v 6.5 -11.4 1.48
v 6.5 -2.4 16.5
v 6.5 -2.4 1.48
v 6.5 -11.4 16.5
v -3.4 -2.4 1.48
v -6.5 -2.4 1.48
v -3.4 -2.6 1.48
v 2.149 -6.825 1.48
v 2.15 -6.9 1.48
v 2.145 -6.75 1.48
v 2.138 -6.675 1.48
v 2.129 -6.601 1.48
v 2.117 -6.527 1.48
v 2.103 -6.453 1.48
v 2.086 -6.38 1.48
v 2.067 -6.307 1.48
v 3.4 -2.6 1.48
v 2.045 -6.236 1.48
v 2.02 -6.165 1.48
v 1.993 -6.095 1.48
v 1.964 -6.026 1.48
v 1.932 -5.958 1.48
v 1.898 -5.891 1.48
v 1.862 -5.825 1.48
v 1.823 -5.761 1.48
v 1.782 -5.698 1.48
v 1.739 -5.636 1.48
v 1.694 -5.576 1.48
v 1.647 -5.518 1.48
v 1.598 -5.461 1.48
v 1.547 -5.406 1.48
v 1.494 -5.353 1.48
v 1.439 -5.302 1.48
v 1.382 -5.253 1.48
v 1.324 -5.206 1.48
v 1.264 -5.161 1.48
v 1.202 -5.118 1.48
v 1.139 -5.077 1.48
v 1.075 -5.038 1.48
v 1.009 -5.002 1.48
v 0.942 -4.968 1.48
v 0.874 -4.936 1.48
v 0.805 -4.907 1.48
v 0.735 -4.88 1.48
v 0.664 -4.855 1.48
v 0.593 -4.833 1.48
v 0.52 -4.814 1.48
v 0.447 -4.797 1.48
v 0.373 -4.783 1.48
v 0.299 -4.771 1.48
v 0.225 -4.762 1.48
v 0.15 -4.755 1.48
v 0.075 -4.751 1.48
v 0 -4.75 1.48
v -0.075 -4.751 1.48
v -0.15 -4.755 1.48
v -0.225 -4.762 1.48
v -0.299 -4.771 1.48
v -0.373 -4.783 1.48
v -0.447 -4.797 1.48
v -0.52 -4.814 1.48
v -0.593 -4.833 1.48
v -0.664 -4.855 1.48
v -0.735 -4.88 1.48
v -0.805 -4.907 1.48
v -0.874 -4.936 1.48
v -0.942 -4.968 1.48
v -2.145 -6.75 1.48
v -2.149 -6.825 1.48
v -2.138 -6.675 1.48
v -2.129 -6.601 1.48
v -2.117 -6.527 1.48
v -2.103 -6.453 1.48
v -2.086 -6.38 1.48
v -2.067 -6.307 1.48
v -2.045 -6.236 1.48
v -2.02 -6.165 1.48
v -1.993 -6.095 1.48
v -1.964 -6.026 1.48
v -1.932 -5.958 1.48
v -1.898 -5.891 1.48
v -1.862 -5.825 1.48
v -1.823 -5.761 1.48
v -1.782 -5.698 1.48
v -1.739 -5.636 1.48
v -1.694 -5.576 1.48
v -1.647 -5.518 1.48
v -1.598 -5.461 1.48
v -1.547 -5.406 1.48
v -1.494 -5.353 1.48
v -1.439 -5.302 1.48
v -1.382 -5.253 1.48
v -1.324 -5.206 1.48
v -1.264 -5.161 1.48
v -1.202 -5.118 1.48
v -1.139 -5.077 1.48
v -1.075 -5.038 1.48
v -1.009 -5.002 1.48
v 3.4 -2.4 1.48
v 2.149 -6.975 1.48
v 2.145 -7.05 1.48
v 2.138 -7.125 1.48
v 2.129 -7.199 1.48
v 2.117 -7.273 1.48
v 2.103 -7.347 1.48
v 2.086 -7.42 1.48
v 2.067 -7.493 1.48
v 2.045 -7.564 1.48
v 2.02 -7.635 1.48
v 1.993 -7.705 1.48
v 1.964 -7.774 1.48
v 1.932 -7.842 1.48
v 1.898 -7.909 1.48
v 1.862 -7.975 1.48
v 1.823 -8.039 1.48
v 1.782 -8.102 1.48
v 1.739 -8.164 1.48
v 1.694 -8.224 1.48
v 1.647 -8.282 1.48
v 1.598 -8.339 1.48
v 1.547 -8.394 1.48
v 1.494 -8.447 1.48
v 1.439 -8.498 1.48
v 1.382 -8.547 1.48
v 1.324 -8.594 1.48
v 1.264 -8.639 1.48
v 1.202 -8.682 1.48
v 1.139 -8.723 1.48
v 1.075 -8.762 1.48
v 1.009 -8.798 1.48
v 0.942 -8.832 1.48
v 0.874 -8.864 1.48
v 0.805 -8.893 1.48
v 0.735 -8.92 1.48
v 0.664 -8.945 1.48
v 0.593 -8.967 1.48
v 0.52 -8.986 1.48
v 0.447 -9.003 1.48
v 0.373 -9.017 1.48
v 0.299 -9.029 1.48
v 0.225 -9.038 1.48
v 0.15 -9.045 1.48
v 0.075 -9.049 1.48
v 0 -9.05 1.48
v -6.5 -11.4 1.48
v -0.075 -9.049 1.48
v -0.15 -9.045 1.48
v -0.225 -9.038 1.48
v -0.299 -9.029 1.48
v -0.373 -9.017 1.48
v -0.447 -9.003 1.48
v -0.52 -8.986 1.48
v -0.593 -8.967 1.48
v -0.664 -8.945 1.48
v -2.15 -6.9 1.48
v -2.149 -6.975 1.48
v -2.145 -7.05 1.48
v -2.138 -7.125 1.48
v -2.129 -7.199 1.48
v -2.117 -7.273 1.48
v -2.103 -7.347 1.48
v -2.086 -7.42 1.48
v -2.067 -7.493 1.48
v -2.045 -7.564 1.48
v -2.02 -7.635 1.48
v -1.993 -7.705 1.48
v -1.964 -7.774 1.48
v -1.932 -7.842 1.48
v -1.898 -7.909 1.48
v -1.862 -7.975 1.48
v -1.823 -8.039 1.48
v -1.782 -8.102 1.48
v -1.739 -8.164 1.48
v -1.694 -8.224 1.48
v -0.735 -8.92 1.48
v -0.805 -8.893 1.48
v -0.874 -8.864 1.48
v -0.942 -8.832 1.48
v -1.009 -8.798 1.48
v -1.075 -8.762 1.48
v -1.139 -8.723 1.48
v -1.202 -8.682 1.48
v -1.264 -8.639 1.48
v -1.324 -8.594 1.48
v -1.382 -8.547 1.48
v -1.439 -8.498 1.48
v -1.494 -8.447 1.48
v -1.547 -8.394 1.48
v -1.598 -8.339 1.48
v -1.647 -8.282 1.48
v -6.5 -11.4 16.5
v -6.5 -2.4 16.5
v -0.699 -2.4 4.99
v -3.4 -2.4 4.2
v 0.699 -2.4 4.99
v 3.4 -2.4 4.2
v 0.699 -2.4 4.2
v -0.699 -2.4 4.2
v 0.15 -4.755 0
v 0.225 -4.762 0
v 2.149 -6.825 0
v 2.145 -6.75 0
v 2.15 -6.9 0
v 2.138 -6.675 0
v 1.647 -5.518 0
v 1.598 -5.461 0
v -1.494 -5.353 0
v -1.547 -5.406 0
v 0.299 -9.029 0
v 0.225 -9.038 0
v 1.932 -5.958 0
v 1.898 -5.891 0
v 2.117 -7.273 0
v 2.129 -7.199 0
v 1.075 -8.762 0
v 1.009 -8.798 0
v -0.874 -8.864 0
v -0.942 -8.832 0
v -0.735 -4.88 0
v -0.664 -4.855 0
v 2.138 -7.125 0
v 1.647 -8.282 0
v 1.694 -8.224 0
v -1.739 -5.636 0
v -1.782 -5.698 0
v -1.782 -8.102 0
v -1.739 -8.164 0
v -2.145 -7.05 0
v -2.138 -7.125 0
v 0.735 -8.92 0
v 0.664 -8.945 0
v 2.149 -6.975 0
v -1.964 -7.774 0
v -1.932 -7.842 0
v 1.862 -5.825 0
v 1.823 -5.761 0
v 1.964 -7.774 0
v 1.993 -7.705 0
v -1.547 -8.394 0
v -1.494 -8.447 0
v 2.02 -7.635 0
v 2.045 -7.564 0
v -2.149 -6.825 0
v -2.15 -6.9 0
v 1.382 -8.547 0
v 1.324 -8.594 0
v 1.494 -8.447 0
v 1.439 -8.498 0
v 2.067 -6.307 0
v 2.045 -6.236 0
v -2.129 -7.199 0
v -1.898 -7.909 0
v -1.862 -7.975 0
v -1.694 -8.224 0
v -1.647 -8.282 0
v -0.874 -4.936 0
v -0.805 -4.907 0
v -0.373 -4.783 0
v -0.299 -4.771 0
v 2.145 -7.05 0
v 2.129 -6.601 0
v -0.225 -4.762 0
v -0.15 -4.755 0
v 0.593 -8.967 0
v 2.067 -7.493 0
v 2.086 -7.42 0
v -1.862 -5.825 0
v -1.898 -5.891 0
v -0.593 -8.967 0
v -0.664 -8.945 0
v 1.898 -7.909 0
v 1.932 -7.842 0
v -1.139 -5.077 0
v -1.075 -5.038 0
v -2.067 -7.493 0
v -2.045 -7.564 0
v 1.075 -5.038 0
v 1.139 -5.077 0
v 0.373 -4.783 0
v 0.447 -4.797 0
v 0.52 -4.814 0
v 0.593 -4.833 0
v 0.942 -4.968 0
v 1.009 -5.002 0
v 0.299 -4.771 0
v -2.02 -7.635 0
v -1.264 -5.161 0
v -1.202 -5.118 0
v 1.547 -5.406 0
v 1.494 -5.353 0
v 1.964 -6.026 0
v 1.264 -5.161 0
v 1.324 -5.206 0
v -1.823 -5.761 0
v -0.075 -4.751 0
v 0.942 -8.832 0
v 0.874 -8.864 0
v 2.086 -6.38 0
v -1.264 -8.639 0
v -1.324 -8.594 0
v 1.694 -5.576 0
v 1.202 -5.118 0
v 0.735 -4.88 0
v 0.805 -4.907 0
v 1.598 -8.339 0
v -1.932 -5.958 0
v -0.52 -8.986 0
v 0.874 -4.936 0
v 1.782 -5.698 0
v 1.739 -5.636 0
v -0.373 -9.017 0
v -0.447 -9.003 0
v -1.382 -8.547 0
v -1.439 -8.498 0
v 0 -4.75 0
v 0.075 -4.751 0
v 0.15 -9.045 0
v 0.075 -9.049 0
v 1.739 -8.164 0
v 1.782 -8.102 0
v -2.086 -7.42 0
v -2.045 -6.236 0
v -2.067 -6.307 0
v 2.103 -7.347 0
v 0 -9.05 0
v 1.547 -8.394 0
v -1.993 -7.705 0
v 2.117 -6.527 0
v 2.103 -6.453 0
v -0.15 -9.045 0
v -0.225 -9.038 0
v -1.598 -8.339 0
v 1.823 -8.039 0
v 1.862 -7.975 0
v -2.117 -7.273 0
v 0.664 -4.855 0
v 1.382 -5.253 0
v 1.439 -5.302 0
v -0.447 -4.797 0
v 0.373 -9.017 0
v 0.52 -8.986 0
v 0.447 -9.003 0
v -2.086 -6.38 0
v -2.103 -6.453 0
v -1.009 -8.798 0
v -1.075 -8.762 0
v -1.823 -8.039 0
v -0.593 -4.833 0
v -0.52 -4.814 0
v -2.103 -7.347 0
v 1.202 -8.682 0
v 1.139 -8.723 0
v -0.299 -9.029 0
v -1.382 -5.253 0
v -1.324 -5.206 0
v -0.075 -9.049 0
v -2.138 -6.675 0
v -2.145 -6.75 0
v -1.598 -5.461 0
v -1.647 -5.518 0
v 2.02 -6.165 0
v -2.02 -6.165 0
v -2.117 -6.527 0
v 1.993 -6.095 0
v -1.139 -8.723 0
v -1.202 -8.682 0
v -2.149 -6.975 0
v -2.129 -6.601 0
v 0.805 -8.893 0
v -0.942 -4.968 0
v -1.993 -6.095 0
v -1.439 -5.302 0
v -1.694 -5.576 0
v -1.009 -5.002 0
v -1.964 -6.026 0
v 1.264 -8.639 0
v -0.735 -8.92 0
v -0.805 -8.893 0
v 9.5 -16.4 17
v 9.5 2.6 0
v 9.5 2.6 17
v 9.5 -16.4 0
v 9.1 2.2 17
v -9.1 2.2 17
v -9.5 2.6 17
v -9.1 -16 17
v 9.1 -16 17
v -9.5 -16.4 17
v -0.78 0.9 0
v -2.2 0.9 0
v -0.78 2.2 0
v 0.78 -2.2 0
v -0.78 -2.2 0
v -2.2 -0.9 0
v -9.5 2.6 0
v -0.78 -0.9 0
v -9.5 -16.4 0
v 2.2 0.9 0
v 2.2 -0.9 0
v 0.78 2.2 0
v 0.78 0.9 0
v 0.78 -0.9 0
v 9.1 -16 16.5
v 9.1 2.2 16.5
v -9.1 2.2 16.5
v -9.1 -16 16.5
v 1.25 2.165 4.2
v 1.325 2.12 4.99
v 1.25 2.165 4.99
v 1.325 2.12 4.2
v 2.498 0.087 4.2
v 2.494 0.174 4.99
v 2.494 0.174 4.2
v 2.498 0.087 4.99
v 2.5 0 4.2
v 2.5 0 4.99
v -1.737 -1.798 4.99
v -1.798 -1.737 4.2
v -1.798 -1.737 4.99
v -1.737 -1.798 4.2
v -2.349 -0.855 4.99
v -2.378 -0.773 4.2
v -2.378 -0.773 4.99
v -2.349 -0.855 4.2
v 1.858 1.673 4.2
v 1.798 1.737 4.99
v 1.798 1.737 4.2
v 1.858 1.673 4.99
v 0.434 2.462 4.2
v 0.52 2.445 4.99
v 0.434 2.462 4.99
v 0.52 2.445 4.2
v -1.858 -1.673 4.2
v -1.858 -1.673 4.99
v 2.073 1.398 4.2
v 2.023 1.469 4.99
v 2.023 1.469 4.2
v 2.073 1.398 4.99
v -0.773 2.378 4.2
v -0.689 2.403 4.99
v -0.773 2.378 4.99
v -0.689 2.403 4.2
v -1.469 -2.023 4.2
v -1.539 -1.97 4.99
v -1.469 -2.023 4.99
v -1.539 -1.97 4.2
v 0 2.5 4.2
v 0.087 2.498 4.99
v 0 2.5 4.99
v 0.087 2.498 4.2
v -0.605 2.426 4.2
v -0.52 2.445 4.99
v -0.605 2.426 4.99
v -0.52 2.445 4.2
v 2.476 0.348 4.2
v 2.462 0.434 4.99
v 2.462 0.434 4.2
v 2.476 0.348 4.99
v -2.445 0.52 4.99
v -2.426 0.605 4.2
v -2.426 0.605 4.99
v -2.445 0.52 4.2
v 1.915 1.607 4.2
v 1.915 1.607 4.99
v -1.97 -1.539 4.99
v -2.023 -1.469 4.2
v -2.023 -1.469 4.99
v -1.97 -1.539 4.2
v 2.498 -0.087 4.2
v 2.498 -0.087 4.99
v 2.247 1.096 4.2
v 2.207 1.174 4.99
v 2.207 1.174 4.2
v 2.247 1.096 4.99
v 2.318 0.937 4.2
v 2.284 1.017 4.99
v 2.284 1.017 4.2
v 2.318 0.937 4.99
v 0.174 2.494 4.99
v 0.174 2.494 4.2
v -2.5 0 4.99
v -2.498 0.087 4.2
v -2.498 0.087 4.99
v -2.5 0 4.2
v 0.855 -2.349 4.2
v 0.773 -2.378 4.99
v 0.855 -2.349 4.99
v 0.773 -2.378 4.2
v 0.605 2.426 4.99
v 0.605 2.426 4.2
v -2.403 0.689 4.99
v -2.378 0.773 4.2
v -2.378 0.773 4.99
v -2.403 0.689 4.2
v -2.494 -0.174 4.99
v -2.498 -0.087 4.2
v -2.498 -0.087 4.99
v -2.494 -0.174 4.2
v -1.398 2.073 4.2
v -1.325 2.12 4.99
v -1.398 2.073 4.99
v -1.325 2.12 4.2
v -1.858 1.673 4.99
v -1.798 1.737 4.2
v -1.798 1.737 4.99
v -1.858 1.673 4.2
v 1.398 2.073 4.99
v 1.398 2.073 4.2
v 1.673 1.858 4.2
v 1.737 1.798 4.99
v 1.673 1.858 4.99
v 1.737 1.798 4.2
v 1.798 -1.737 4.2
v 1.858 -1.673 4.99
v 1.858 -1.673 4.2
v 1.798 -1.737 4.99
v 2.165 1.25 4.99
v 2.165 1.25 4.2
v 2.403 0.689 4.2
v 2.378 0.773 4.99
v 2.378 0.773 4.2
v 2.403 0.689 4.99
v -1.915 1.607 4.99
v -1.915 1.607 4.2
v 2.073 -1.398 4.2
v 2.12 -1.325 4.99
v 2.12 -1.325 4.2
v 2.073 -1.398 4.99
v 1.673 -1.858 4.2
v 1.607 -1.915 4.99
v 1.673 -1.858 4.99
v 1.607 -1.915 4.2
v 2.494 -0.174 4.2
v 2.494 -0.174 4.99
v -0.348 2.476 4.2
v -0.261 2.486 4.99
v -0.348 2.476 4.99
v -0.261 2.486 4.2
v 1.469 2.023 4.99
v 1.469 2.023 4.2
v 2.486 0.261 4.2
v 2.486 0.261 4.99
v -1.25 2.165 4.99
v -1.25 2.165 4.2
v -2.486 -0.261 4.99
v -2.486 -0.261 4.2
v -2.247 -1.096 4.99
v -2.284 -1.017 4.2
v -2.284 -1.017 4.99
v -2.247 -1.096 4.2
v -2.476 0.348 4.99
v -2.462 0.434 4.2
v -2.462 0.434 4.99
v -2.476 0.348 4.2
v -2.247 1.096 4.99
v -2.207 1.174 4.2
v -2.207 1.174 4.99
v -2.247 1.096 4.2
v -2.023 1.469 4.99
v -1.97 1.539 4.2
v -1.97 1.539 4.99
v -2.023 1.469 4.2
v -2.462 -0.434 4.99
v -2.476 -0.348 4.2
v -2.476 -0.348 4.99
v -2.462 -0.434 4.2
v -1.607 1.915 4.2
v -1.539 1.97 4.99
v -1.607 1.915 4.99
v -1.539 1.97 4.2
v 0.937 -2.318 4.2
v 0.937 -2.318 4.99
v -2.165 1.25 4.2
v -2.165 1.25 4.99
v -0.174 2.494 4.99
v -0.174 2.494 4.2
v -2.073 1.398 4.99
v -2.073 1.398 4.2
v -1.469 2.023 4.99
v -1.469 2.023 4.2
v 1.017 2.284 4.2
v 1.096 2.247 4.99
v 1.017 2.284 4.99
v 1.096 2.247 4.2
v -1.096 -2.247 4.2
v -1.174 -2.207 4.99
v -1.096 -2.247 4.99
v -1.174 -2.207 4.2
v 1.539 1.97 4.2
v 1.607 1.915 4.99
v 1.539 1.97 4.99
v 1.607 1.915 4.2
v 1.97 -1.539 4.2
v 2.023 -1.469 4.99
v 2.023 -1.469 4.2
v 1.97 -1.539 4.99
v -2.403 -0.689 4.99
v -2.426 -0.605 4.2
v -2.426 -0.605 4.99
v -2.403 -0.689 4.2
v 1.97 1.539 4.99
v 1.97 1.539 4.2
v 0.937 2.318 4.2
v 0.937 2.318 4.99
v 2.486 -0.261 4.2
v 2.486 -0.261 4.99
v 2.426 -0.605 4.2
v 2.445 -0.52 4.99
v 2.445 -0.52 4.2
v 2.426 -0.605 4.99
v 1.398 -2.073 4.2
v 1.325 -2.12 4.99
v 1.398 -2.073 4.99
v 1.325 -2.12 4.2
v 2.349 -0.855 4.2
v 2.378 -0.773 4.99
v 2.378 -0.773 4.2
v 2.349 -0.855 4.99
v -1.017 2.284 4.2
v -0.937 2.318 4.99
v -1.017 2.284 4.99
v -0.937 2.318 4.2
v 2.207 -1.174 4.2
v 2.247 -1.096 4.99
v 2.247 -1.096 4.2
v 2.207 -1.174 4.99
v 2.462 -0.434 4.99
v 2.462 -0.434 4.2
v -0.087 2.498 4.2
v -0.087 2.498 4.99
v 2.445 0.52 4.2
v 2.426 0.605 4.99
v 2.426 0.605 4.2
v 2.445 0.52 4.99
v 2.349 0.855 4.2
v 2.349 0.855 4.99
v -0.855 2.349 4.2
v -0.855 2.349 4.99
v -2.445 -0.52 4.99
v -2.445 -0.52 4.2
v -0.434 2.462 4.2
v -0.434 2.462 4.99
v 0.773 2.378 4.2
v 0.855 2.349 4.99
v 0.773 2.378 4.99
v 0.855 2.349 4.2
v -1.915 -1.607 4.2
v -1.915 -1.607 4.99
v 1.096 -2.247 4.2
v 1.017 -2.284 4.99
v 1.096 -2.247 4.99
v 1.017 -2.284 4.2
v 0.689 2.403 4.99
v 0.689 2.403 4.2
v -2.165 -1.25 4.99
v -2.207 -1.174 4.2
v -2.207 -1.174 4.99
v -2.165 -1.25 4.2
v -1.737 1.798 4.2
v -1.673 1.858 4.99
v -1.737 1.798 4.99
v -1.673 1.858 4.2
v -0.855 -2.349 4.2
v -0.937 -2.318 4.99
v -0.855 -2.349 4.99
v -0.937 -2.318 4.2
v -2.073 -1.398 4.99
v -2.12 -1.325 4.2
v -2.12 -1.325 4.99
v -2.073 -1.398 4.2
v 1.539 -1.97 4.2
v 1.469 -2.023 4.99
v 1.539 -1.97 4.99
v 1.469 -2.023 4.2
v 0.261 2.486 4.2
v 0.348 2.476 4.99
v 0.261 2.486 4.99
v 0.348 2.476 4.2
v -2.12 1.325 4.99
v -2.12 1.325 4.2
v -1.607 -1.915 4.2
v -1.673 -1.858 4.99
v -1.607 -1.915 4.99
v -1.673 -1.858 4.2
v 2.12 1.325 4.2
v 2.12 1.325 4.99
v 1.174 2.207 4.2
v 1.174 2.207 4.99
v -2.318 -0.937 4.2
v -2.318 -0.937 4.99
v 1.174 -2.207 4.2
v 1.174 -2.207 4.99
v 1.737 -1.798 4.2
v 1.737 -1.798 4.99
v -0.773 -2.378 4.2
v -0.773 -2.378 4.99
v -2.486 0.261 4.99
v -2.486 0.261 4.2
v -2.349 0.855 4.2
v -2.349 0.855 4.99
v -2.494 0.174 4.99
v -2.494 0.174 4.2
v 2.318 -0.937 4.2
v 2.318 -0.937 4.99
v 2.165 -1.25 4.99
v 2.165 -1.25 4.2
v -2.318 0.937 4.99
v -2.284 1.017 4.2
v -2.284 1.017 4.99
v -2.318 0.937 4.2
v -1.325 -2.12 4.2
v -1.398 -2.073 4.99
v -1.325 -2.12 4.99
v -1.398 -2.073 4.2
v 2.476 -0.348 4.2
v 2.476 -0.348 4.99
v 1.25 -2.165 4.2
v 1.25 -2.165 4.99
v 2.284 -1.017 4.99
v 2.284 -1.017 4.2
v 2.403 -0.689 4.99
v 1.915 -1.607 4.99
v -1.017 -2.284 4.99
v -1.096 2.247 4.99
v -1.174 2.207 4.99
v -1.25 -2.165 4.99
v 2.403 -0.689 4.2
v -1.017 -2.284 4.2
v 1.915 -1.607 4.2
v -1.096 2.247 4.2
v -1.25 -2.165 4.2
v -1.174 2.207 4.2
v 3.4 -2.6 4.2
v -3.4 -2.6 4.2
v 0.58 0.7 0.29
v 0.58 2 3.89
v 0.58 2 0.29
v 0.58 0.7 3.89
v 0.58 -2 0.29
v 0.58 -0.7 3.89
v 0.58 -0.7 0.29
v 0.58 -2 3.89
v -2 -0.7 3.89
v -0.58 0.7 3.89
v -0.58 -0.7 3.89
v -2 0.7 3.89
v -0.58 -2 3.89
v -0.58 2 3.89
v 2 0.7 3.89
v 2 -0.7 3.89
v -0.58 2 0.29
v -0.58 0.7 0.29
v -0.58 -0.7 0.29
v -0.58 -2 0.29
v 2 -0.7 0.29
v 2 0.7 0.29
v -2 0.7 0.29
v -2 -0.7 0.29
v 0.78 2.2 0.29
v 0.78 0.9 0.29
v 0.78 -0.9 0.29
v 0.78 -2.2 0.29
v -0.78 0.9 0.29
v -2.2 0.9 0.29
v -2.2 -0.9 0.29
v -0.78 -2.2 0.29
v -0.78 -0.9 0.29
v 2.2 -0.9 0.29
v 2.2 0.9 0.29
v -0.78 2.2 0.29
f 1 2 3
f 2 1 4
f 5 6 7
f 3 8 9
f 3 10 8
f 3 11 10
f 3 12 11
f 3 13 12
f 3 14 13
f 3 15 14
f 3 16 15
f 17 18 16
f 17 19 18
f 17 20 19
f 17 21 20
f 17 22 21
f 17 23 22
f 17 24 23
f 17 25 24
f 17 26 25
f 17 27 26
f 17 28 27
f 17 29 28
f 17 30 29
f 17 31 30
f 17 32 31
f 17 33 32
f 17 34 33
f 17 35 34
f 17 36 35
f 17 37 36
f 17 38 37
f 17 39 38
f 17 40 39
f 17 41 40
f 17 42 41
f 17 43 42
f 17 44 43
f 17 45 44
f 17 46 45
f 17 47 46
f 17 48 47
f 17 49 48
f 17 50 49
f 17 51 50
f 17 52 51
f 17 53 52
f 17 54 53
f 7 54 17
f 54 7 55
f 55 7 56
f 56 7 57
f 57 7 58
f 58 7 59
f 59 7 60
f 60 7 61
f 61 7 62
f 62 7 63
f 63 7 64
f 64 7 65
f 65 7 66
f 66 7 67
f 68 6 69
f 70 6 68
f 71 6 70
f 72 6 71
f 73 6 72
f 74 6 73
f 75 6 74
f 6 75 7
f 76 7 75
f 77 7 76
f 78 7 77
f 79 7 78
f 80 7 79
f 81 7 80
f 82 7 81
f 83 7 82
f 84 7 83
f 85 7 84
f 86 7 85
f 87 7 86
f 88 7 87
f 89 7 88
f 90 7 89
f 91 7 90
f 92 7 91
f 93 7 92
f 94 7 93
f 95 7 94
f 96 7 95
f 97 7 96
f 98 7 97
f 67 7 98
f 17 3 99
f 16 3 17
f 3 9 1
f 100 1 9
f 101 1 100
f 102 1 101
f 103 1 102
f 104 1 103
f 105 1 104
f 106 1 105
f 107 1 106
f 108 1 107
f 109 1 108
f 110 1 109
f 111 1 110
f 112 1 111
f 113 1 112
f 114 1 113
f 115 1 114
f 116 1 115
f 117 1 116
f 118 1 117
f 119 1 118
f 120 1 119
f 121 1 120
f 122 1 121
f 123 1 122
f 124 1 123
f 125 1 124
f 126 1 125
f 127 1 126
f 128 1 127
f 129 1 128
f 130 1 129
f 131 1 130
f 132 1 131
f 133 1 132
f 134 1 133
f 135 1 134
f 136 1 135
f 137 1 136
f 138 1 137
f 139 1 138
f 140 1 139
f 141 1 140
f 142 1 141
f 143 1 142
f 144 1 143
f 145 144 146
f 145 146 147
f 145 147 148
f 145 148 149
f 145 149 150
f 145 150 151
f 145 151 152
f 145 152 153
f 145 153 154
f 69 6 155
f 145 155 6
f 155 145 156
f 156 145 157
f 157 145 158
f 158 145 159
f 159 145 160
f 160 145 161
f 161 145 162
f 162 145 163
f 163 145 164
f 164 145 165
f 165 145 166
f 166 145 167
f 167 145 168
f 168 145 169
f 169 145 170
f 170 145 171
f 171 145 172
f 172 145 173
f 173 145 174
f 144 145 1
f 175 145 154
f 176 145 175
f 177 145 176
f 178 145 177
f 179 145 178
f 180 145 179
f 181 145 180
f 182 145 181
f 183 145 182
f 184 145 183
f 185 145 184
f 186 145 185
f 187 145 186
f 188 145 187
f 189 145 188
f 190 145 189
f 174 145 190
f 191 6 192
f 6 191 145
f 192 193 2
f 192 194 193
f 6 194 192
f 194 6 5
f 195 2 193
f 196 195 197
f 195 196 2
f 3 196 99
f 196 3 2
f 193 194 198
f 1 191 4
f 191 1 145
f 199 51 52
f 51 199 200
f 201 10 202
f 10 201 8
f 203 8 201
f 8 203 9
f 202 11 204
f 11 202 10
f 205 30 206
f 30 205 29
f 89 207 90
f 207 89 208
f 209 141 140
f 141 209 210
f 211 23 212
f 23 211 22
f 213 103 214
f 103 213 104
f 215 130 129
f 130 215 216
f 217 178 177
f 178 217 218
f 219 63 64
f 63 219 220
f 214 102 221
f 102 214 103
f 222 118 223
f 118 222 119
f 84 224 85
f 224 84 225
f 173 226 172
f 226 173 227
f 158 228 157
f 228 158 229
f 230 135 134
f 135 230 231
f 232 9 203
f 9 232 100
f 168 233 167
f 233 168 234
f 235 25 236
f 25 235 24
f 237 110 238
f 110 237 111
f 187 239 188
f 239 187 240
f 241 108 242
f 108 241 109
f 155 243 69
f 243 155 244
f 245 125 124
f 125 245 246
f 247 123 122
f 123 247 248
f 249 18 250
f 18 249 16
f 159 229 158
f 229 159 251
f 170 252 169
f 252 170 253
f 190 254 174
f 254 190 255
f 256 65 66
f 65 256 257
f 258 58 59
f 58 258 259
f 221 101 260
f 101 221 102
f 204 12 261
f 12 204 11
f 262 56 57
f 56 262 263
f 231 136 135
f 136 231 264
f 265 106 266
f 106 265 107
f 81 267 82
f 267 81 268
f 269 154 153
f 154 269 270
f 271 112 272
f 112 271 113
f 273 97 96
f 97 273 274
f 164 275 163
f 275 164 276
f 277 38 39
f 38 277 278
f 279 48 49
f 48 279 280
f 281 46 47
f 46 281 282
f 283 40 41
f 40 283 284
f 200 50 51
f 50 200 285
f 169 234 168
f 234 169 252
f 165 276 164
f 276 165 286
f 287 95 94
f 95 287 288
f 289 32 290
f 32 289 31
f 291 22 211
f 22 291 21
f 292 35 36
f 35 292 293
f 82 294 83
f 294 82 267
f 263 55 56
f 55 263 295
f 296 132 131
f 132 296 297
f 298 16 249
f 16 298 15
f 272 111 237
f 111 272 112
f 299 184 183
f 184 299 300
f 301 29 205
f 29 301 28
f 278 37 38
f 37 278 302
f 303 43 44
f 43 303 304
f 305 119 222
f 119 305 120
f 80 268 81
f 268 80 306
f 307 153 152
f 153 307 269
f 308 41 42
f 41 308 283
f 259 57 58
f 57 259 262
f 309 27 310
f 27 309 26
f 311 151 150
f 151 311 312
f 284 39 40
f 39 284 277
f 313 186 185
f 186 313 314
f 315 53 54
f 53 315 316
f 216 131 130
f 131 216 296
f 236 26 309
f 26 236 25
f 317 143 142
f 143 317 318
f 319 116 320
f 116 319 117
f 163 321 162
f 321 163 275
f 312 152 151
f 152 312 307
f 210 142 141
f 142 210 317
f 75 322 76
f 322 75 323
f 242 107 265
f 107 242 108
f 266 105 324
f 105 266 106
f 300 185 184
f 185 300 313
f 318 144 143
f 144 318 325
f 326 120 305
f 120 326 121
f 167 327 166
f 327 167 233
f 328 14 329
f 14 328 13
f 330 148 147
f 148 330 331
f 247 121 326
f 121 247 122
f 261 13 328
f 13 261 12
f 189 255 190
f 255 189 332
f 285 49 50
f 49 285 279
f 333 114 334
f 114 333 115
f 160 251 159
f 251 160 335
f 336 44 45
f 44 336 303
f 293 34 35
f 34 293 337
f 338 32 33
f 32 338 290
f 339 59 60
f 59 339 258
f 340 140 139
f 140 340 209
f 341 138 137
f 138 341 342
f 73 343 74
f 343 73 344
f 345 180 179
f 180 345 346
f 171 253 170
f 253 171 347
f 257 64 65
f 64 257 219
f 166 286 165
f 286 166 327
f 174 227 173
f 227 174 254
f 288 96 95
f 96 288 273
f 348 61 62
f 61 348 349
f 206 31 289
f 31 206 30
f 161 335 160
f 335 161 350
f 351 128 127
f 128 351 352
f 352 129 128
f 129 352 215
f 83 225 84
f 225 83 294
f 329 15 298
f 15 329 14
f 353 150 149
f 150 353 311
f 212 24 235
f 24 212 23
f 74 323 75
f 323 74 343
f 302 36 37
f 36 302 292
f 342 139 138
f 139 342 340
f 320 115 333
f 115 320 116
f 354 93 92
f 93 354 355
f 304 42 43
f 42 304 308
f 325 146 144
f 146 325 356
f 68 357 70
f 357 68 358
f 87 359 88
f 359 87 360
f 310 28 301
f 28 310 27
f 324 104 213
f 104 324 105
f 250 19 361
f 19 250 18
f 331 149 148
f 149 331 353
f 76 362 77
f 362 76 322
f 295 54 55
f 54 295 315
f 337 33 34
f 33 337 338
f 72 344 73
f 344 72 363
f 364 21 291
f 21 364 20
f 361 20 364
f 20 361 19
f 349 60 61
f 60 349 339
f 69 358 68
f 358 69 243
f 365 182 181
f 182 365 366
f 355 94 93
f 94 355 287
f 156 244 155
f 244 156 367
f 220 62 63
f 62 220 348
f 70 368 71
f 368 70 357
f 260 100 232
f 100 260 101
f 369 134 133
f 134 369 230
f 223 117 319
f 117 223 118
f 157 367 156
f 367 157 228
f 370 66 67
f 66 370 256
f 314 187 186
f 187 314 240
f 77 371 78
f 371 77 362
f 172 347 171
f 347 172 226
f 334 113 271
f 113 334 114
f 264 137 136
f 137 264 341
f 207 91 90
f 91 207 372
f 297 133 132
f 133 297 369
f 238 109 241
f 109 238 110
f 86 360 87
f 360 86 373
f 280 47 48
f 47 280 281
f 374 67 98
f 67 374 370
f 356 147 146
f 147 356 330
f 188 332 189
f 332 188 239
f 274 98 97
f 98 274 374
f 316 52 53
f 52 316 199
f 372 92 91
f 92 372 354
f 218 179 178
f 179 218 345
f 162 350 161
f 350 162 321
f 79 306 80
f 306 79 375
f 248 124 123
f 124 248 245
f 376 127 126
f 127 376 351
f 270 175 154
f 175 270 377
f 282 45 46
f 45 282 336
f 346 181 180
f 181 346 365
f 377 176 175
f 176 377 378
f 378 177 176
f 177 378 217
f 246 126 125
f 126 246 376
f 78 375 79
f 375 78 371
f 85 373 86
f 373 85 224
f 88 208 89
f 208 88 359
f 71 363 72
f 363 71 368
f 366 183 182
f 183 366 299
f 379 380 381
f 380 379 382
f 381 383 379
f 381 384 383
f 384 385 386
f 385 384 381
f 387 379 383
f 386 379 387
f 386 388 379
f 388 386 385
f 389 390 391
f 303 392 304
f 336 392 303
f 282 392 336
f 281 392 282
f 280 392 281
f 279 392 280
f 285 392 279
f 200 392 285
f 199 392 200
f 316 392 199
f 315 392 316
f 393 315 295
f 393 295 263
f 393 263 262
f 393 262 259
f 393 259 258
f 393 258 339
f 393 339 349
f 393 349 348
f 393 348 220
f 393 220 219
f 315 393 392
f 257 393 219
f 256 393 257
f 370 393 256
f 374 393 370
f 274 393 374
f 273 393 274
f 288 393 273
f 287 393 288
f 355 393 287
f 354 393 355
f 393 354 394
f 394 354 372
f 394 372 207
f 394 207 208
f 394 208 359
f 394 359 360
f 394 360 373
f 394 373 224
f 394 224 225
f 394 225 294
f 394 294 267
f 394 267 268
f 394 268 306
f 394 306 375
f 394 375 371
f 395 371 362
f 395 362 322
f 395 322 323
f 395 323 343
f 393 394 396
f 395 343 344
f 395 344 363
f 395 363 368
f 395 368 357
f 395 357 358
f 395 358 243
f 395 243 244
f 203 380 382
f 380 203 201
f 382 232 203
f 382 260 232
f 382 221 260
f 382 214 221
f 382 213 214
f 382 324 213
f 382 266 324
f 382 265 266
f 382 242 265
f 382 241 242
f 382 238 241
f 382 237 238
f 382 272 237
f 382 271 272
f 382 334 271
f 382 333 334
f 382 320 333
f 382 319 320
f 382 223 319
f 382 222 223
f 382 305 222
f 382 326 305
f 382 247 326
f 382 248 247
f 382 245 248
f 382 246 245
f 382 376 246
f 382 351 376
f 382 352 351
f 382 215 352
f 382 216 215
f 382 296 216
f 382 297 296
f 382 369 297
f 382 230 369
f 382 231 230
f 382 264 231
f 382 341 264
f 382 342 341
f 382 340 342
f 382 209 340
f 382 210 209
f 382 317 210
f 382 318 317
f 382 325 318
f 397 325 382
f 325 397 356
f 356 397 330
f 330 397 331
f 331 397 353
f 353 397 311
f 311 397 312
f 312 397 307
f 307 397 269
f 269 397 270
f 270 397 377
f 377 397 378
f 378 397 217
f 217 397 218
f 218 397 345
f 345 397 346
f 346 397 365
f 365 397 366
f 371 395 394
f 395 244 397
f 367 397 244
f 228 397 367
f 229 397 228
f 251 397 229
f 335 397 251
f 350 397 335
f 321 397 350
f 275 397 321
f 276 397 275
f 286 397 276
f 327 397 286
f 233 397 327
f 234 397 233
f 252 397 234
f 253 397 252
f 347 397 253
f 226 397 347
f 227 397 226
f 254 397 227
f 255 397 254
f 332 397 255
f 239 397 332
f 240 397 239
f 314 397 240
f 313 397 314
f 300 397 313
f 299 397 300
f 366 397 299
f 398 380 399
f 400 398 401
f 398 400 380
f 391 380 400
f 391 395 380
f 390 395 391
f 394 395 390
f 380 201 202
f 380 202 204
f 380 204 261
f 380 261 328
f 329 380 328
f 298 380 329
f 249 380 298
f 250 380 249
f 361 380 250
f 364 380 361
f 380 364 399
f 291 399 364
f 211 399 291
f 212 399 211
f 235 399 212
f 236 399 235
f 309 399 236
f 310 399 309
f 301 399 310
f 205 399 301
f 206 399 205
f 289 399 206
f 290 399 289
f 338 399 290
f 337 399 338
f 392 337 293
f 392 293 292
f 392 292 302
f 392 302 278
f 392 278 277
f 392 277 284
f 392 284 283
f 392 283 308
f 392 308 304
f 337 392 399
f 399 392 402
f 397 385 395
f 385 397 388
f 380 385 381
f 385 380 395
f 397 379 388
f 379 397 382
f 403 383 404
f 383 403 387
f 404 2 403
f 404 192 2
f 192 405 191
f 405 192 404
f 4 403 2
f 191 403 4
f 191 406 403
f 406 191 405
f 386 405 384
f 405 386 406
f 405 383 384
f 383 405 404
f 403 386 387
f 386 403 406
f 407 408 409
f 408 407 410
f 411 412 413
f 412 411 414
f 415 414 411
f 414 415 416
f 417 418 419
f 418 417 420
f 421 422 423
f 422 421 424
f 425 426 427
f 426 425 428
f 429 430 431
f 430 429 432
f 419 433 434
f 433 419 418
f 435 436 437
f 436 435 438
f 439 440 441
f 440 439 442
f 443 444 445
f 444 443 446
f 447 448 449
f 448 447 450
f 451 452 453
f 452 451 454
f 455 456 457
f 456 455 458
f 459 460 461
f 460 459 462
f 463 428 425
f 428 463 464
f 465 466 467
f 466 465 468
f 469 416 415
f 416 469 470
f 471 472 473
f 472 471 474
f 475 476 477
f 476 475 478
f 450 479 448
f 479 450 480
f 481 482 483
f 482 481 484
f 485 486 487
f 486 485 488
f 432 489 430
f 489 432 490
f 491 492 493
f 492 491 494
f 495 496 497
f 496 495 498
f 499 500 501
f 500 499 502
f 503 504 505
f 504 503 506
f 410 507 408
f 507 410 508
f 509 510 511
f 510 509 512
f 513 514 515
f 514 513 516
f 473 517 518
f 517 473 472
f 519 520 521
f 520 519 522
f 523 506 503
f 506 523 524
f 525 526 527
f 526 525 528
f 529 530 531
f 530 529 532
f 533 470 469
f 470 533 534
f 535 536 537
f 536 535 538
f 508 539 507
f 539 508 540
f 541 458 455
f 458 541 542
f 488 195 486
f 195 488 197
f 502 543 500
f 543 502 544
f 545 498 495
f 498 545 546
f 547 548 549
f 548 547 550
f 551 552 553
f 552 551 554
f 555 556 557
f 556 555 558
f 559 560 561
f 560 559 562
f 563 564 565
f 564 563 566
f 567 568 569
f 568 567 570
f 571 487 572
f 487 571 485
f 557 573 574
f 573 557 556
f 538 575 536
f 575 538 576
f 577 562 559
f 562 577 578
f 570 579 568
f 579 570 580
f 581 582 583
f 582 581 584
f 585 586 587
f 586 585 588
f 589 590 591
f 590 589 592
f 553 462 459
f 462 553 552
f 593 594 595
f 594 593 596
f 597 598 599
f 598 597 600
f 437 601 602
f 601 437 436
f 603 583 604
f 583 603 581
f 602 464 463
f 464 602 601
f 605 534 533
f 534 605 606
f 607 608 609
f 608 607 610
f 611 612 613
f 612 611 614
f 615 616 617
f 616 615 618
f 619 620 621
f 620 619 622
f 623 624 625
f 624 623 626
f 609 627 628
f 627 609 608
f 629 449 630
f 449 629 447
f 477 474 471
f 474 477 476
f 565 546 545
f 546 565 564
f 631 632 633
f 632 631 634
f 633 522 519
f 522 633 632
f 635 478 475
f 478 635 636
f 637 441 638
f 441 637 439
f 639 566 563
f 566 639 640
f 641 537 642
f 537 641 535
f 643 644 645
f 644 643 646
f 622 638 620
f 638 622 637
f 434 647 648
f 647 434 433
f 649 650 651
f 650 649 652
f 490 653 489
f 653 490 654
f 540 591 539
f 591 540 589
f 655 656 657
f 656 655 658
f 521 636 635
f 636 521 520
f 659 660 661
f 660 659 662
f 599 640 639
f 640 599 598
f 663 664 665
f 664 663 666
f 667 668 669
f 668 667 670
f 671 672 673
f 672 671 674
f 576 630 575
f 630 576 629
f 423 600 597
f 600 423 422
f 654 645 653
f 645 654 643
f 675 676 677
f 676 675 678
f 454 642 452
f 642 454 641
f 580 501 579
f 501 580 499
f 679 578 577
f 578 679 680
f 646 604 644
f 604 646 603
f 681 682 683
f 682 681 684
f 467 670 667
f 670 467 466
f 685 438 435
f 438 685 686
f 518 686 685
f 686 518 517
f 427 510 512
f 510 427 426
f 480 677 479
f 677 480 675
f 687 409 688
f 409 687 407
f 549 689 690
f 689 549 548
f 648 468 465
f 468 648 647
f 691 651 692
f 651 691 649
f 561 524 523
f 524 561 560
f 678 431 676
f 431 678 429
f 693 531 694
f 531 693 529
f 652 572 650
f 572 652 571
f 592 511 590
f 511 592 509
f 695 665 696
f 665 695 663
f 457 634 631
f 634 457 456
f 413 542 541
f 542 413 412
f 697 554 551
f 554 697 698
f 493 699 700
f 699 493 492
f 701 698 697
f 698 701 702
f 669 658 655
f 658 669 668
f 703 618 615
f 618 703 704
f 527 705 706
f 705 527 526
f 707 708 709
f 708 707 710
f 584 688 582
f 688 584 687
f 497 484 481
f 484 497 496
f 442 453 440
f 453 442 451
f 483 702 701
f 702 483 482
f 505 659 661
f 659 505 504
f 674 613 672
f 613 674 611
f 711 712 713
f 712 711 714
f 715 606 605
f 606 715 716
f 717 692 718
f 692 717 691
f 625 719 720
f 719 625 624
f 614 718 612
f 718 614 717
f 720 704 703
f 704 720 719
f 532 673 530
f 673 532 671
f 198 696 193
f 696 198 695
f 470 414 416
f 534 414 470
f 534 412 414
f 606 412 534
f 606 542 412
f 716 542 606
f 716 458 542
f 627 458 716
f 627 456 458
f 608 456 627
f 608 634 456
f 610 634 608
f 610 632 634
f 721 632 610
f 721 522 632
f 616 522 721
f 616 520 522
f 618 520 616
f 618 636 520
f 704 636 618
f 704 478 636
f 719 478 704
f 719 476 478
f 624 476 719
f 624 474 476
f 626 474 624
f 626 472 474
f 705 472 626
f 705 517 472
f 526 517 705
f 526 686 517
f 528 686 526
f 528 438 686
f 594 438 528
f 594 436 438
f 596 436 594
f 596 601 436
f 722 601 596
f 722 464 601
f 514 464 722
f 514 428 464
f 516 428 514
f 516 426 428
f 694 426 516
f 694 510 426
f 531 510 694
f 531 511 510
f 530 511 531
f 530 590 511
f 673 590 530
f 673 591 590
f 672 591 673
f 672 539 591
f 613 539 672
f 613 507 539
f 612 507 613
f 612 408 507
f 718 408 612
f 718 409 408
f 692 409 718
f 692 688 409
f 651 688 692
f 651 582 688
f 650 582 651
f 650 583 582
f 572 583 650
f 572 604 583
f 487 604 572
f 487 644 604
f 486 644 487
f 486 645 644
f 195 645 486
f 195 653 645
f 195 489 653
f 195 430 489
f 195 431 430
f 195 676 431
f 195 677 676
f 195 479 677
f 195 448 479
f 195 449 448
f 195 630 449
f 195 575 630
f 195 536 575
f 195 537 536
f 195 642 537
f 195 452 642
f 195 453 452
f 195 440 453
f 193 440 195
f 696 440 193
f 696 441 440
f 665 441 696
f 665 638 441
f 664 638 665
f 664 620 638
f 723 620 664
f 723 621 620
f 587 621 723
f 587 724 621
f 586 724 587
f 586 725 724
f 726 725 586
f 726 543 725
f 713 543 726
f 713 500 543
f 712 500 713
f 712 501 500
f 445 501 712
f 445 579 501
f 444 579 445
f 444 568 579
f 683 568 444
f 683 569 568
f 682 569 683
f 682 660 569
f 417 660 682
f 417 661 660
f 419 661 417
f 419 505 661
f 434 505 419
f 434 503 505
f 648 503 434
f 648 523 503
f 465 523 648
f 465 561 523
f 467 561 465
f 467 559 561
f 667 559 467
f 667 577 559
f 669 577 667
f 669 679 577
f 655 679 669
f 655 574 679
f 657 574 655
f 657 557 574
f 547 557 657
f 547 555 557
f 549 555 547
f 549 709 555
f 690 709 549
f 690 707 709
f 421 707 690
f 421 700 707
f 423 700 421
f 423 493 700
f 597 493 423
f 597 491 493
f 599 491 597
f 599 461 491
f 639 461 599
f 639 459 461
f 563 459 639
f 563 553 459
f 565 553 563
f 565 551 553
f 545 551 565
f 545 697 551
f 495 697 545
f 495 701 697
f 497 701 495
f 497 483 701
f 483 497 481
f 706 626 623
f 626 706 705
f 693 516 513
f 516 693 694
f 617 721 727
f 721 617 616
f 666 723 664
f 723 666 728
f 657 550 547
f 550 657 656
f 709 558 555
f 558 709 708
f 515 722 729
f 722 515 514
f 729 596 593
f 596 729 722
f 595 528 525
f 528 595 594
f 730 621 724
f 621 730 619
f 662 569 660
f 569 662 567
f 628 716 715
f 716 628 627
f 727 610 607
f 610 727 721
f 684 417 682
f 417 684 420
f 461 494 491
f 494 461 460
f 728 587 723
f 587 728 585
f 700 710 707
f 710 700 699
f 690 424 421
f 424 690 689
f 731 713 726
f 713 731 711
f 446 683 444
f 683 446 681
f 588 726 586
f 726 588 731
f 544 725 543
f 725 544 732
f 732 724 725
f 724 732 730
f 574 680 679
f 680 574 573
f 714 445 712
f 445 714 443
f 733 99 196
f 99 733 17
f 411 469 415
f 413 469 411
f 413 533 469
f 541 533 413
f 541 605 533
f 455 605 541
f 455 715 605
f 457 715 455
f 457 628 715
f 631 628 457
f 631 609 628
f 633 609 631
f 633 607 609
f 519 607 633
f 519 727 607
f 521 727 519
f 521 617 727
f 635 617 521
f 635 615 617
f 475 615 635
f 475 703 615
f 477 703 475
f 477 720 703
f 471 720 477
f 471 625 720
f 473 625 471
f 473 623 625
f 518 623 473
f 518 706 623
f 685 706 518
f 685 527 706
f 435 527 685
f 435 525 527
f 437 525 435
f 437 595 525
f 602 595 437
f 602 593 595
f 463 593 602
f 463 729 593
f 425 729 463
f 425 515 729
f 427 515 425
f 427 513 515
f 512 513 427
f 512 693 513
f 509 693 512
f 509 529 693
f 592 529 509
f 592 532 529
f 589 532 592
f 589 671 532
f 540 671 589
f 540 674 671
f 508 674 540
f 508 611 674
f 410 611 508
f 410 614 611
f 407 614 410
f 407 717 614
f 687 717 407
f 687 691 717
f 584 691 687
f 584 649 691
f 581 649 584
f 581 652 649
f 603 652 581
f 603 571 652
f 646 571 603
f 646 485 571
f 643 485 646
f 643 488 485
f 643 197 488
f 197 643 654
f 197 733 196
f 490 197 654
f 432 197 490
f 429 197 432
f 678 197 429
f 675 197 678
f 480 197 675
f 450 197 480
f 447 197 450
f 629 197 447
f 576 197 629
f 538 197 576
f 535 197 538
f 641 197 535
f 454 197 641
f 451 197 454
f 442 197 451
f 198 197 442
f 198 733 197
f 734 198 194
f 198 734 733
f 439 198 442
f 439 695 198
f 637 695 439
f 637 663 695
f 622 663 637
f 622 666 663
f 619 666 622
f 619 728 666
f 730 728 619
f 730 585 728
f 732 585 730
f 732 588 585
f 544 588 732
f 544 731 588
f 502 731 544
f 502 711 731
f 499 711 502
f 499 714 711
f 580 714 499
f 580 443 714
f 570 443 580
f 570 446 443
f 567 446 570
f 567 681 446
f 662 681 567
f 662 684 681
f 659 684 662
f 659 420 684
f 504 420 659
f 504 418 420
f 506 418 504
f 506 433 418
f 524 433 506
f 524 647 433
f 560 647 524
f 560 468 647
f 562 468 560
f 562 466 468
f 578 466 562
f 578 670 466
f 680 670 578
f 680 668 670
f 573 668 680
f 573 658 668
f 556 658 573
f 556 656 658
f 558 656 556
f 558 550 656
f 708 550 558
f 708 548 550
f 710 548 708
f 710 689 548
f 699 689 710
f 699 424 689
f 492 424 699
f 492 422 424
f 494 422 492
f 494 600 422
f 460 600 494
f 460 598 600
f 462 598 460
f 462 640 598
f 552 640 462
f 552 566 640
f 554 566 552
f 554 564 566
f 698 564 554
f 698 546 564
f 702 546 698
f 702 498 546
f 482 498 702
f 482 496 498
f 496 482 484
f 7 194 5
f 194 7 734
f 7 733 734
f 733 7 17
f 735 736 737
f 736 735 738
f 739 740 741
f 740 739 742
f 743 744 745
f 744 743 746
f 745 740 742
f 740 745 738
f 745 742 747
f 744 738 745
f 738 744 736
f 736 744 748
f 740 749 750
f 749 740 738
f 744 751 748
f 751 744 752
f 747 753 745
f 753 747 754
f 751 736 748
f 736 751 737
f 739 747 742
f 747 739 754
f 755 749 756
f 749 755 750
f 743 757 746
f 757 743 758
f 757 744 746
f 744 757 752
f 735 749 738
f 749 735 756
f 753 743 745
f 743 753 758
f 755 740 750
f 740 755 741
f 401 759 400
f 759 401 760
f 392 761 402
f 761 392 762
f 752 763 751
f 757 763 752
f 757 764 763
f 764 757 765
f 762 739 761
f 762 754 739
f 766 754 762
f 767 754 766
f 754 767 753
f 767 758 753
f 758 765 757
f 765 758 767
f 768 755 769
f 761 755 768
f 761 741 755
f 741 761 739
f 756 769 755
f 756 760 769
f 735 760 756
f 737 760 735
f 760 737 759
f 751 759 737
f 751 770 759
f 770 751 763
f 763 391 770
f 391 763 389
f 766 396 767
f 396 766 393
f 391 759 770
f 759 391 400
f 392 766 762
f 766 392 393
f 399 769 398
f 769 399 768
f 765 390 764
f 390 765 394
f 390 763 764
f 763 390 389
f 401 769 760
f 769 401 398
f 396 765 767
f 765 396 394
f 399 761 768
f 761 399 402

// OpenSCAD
// file: cherry-female.scad
$fn=180;
eps=0.01;

// Params Cherry mate
cherry_thick1=1.16;
cherry_thick2=1.40;
cherry_wide=4.00;
cherry_high=3.90;
//shaft_high=5.00;
shaft_high=cherry_high+0.3;
shaft_wide=6.80;
shaft_deep=5.20;
fudge_high=0.30;
fudge_plus=0.40;

// Cherry mate
difference() {
    // base body
    translate([0, 0, shaft_high/2]) cube([shaft_wide, shaft_deep, shaft_high], center=true);
    // cherry splines
    translate([0, 0, cherry_high/2-eps]) 
        cube([cherry_thick1, cherry_wide, cherry_high], center=true); 
    translate([0, 0, cherry_high/2-eps]) 
        cube([cherry_wide, cherry_thick2, cherry_high], center=true); 
    // fudge bottom layer
    translate([0, 0, fudge_high/2-eps]) 
        cube([cherry_thick1+fudge_plus, cherry_wide+fudge_plus, fudge_high], center=true); 
    translate([0, 0, fudge_high/2-eps]) 
        cube([cherry_wide+fudge_plus, cherry_thick2+fudge_plus, fudge_high], center=true);
    
    
    // debug
    //translate([0, 0, -0.01]) cube(90);
}
// main file
$fn=180;
eps=0.01;

// keycap model
// 0 is fcu square
// 1 is smaller rect
// 2 is big warn square
// 3 is small TO config
kmod=2;

// Params key cap
kc_tall=17.00;
kc_high=[11.589, 7.753, 19.00, 7.753];
kc_wide=[11.589, 11.589, 19.00, 11.589];
led_high=[3.123, 3.123, 9.000, 0];
led_wide=[8.958, 8.958, 13.000, 0];
led_x=(kc_wide[kmod]-led_wide[kmod])/2;
//led_y=[1.791, 1.253, 4.50, 0];
led_y=[1.791, 0.754, 5.0, 0];
led_flange_high=1.50;
led_flange_rad=4.30/2;
top_to_sw_center=[8.849, 8.311, 16.4, 8.311];
well_wall_thick=0.40;
well_depth=0.50;

translate([-kc_wide[kmod]/2, -top_to_sw_center[kmod], 0]) {
    // Debug label insert
//    translate([well_wall_thick, well_wall_thick, kc_tall-well_depth]) 
//        color("red", 0.2)
//            cube([kc_wide[kmod]-well_wall_thick*2, kc_high[kmod]-well_wall_thick*2, well_depth]);
//    echo(kc_wide[kmod]-well_wall_thick*2, kc_high[kmod]-well_wall_thick*2);
    
    difference() {
        // keycap body
        union() {
            cube([kc_wide[kmod], kc_high[kmod], kc_tall]);
        }
        // Debug
        //translate([kc_wide[kmod]/2, -eps, -eps]) cube(99);
        // led cavity
        if (led_y[kmod] > 0) {
            translate([led_x, led_y[kmod], led_flange_high-eps*2]) cube([led_wide[kmod], led_high[kmod], 99]);
            translate([kc_wide[kmod]/2, led_y[kmod]+led_high[kmod]/2, -eps]) cylinder(led_flange_high, led_flange_rad, led_flange_rad);
        }
        // top well cavity
        translate([well_wall_thick, well_wall_thick, kc_tall-well_depth])
            cube([kc_wide[kmod]-well_wall_thick*2, kc_high[kmod]-well_wall_thick*2, 99]);
        // key mate cavity
        translate([kc_wide[kmod]/2, top_to_sw_center[kmod], -eps])
            cylinder(5, 2.5, 2.5);
    }
}

// fix thin wall near led
if (kmod == 1) {
    translate([-2.5, -top_to_sw_center[kmod]-0.8+eps, 0]) cube([5, 0.8, led_flange_high+0.5]);
}

// key mate
union() {
    include <cherry-female.scad>;
}
